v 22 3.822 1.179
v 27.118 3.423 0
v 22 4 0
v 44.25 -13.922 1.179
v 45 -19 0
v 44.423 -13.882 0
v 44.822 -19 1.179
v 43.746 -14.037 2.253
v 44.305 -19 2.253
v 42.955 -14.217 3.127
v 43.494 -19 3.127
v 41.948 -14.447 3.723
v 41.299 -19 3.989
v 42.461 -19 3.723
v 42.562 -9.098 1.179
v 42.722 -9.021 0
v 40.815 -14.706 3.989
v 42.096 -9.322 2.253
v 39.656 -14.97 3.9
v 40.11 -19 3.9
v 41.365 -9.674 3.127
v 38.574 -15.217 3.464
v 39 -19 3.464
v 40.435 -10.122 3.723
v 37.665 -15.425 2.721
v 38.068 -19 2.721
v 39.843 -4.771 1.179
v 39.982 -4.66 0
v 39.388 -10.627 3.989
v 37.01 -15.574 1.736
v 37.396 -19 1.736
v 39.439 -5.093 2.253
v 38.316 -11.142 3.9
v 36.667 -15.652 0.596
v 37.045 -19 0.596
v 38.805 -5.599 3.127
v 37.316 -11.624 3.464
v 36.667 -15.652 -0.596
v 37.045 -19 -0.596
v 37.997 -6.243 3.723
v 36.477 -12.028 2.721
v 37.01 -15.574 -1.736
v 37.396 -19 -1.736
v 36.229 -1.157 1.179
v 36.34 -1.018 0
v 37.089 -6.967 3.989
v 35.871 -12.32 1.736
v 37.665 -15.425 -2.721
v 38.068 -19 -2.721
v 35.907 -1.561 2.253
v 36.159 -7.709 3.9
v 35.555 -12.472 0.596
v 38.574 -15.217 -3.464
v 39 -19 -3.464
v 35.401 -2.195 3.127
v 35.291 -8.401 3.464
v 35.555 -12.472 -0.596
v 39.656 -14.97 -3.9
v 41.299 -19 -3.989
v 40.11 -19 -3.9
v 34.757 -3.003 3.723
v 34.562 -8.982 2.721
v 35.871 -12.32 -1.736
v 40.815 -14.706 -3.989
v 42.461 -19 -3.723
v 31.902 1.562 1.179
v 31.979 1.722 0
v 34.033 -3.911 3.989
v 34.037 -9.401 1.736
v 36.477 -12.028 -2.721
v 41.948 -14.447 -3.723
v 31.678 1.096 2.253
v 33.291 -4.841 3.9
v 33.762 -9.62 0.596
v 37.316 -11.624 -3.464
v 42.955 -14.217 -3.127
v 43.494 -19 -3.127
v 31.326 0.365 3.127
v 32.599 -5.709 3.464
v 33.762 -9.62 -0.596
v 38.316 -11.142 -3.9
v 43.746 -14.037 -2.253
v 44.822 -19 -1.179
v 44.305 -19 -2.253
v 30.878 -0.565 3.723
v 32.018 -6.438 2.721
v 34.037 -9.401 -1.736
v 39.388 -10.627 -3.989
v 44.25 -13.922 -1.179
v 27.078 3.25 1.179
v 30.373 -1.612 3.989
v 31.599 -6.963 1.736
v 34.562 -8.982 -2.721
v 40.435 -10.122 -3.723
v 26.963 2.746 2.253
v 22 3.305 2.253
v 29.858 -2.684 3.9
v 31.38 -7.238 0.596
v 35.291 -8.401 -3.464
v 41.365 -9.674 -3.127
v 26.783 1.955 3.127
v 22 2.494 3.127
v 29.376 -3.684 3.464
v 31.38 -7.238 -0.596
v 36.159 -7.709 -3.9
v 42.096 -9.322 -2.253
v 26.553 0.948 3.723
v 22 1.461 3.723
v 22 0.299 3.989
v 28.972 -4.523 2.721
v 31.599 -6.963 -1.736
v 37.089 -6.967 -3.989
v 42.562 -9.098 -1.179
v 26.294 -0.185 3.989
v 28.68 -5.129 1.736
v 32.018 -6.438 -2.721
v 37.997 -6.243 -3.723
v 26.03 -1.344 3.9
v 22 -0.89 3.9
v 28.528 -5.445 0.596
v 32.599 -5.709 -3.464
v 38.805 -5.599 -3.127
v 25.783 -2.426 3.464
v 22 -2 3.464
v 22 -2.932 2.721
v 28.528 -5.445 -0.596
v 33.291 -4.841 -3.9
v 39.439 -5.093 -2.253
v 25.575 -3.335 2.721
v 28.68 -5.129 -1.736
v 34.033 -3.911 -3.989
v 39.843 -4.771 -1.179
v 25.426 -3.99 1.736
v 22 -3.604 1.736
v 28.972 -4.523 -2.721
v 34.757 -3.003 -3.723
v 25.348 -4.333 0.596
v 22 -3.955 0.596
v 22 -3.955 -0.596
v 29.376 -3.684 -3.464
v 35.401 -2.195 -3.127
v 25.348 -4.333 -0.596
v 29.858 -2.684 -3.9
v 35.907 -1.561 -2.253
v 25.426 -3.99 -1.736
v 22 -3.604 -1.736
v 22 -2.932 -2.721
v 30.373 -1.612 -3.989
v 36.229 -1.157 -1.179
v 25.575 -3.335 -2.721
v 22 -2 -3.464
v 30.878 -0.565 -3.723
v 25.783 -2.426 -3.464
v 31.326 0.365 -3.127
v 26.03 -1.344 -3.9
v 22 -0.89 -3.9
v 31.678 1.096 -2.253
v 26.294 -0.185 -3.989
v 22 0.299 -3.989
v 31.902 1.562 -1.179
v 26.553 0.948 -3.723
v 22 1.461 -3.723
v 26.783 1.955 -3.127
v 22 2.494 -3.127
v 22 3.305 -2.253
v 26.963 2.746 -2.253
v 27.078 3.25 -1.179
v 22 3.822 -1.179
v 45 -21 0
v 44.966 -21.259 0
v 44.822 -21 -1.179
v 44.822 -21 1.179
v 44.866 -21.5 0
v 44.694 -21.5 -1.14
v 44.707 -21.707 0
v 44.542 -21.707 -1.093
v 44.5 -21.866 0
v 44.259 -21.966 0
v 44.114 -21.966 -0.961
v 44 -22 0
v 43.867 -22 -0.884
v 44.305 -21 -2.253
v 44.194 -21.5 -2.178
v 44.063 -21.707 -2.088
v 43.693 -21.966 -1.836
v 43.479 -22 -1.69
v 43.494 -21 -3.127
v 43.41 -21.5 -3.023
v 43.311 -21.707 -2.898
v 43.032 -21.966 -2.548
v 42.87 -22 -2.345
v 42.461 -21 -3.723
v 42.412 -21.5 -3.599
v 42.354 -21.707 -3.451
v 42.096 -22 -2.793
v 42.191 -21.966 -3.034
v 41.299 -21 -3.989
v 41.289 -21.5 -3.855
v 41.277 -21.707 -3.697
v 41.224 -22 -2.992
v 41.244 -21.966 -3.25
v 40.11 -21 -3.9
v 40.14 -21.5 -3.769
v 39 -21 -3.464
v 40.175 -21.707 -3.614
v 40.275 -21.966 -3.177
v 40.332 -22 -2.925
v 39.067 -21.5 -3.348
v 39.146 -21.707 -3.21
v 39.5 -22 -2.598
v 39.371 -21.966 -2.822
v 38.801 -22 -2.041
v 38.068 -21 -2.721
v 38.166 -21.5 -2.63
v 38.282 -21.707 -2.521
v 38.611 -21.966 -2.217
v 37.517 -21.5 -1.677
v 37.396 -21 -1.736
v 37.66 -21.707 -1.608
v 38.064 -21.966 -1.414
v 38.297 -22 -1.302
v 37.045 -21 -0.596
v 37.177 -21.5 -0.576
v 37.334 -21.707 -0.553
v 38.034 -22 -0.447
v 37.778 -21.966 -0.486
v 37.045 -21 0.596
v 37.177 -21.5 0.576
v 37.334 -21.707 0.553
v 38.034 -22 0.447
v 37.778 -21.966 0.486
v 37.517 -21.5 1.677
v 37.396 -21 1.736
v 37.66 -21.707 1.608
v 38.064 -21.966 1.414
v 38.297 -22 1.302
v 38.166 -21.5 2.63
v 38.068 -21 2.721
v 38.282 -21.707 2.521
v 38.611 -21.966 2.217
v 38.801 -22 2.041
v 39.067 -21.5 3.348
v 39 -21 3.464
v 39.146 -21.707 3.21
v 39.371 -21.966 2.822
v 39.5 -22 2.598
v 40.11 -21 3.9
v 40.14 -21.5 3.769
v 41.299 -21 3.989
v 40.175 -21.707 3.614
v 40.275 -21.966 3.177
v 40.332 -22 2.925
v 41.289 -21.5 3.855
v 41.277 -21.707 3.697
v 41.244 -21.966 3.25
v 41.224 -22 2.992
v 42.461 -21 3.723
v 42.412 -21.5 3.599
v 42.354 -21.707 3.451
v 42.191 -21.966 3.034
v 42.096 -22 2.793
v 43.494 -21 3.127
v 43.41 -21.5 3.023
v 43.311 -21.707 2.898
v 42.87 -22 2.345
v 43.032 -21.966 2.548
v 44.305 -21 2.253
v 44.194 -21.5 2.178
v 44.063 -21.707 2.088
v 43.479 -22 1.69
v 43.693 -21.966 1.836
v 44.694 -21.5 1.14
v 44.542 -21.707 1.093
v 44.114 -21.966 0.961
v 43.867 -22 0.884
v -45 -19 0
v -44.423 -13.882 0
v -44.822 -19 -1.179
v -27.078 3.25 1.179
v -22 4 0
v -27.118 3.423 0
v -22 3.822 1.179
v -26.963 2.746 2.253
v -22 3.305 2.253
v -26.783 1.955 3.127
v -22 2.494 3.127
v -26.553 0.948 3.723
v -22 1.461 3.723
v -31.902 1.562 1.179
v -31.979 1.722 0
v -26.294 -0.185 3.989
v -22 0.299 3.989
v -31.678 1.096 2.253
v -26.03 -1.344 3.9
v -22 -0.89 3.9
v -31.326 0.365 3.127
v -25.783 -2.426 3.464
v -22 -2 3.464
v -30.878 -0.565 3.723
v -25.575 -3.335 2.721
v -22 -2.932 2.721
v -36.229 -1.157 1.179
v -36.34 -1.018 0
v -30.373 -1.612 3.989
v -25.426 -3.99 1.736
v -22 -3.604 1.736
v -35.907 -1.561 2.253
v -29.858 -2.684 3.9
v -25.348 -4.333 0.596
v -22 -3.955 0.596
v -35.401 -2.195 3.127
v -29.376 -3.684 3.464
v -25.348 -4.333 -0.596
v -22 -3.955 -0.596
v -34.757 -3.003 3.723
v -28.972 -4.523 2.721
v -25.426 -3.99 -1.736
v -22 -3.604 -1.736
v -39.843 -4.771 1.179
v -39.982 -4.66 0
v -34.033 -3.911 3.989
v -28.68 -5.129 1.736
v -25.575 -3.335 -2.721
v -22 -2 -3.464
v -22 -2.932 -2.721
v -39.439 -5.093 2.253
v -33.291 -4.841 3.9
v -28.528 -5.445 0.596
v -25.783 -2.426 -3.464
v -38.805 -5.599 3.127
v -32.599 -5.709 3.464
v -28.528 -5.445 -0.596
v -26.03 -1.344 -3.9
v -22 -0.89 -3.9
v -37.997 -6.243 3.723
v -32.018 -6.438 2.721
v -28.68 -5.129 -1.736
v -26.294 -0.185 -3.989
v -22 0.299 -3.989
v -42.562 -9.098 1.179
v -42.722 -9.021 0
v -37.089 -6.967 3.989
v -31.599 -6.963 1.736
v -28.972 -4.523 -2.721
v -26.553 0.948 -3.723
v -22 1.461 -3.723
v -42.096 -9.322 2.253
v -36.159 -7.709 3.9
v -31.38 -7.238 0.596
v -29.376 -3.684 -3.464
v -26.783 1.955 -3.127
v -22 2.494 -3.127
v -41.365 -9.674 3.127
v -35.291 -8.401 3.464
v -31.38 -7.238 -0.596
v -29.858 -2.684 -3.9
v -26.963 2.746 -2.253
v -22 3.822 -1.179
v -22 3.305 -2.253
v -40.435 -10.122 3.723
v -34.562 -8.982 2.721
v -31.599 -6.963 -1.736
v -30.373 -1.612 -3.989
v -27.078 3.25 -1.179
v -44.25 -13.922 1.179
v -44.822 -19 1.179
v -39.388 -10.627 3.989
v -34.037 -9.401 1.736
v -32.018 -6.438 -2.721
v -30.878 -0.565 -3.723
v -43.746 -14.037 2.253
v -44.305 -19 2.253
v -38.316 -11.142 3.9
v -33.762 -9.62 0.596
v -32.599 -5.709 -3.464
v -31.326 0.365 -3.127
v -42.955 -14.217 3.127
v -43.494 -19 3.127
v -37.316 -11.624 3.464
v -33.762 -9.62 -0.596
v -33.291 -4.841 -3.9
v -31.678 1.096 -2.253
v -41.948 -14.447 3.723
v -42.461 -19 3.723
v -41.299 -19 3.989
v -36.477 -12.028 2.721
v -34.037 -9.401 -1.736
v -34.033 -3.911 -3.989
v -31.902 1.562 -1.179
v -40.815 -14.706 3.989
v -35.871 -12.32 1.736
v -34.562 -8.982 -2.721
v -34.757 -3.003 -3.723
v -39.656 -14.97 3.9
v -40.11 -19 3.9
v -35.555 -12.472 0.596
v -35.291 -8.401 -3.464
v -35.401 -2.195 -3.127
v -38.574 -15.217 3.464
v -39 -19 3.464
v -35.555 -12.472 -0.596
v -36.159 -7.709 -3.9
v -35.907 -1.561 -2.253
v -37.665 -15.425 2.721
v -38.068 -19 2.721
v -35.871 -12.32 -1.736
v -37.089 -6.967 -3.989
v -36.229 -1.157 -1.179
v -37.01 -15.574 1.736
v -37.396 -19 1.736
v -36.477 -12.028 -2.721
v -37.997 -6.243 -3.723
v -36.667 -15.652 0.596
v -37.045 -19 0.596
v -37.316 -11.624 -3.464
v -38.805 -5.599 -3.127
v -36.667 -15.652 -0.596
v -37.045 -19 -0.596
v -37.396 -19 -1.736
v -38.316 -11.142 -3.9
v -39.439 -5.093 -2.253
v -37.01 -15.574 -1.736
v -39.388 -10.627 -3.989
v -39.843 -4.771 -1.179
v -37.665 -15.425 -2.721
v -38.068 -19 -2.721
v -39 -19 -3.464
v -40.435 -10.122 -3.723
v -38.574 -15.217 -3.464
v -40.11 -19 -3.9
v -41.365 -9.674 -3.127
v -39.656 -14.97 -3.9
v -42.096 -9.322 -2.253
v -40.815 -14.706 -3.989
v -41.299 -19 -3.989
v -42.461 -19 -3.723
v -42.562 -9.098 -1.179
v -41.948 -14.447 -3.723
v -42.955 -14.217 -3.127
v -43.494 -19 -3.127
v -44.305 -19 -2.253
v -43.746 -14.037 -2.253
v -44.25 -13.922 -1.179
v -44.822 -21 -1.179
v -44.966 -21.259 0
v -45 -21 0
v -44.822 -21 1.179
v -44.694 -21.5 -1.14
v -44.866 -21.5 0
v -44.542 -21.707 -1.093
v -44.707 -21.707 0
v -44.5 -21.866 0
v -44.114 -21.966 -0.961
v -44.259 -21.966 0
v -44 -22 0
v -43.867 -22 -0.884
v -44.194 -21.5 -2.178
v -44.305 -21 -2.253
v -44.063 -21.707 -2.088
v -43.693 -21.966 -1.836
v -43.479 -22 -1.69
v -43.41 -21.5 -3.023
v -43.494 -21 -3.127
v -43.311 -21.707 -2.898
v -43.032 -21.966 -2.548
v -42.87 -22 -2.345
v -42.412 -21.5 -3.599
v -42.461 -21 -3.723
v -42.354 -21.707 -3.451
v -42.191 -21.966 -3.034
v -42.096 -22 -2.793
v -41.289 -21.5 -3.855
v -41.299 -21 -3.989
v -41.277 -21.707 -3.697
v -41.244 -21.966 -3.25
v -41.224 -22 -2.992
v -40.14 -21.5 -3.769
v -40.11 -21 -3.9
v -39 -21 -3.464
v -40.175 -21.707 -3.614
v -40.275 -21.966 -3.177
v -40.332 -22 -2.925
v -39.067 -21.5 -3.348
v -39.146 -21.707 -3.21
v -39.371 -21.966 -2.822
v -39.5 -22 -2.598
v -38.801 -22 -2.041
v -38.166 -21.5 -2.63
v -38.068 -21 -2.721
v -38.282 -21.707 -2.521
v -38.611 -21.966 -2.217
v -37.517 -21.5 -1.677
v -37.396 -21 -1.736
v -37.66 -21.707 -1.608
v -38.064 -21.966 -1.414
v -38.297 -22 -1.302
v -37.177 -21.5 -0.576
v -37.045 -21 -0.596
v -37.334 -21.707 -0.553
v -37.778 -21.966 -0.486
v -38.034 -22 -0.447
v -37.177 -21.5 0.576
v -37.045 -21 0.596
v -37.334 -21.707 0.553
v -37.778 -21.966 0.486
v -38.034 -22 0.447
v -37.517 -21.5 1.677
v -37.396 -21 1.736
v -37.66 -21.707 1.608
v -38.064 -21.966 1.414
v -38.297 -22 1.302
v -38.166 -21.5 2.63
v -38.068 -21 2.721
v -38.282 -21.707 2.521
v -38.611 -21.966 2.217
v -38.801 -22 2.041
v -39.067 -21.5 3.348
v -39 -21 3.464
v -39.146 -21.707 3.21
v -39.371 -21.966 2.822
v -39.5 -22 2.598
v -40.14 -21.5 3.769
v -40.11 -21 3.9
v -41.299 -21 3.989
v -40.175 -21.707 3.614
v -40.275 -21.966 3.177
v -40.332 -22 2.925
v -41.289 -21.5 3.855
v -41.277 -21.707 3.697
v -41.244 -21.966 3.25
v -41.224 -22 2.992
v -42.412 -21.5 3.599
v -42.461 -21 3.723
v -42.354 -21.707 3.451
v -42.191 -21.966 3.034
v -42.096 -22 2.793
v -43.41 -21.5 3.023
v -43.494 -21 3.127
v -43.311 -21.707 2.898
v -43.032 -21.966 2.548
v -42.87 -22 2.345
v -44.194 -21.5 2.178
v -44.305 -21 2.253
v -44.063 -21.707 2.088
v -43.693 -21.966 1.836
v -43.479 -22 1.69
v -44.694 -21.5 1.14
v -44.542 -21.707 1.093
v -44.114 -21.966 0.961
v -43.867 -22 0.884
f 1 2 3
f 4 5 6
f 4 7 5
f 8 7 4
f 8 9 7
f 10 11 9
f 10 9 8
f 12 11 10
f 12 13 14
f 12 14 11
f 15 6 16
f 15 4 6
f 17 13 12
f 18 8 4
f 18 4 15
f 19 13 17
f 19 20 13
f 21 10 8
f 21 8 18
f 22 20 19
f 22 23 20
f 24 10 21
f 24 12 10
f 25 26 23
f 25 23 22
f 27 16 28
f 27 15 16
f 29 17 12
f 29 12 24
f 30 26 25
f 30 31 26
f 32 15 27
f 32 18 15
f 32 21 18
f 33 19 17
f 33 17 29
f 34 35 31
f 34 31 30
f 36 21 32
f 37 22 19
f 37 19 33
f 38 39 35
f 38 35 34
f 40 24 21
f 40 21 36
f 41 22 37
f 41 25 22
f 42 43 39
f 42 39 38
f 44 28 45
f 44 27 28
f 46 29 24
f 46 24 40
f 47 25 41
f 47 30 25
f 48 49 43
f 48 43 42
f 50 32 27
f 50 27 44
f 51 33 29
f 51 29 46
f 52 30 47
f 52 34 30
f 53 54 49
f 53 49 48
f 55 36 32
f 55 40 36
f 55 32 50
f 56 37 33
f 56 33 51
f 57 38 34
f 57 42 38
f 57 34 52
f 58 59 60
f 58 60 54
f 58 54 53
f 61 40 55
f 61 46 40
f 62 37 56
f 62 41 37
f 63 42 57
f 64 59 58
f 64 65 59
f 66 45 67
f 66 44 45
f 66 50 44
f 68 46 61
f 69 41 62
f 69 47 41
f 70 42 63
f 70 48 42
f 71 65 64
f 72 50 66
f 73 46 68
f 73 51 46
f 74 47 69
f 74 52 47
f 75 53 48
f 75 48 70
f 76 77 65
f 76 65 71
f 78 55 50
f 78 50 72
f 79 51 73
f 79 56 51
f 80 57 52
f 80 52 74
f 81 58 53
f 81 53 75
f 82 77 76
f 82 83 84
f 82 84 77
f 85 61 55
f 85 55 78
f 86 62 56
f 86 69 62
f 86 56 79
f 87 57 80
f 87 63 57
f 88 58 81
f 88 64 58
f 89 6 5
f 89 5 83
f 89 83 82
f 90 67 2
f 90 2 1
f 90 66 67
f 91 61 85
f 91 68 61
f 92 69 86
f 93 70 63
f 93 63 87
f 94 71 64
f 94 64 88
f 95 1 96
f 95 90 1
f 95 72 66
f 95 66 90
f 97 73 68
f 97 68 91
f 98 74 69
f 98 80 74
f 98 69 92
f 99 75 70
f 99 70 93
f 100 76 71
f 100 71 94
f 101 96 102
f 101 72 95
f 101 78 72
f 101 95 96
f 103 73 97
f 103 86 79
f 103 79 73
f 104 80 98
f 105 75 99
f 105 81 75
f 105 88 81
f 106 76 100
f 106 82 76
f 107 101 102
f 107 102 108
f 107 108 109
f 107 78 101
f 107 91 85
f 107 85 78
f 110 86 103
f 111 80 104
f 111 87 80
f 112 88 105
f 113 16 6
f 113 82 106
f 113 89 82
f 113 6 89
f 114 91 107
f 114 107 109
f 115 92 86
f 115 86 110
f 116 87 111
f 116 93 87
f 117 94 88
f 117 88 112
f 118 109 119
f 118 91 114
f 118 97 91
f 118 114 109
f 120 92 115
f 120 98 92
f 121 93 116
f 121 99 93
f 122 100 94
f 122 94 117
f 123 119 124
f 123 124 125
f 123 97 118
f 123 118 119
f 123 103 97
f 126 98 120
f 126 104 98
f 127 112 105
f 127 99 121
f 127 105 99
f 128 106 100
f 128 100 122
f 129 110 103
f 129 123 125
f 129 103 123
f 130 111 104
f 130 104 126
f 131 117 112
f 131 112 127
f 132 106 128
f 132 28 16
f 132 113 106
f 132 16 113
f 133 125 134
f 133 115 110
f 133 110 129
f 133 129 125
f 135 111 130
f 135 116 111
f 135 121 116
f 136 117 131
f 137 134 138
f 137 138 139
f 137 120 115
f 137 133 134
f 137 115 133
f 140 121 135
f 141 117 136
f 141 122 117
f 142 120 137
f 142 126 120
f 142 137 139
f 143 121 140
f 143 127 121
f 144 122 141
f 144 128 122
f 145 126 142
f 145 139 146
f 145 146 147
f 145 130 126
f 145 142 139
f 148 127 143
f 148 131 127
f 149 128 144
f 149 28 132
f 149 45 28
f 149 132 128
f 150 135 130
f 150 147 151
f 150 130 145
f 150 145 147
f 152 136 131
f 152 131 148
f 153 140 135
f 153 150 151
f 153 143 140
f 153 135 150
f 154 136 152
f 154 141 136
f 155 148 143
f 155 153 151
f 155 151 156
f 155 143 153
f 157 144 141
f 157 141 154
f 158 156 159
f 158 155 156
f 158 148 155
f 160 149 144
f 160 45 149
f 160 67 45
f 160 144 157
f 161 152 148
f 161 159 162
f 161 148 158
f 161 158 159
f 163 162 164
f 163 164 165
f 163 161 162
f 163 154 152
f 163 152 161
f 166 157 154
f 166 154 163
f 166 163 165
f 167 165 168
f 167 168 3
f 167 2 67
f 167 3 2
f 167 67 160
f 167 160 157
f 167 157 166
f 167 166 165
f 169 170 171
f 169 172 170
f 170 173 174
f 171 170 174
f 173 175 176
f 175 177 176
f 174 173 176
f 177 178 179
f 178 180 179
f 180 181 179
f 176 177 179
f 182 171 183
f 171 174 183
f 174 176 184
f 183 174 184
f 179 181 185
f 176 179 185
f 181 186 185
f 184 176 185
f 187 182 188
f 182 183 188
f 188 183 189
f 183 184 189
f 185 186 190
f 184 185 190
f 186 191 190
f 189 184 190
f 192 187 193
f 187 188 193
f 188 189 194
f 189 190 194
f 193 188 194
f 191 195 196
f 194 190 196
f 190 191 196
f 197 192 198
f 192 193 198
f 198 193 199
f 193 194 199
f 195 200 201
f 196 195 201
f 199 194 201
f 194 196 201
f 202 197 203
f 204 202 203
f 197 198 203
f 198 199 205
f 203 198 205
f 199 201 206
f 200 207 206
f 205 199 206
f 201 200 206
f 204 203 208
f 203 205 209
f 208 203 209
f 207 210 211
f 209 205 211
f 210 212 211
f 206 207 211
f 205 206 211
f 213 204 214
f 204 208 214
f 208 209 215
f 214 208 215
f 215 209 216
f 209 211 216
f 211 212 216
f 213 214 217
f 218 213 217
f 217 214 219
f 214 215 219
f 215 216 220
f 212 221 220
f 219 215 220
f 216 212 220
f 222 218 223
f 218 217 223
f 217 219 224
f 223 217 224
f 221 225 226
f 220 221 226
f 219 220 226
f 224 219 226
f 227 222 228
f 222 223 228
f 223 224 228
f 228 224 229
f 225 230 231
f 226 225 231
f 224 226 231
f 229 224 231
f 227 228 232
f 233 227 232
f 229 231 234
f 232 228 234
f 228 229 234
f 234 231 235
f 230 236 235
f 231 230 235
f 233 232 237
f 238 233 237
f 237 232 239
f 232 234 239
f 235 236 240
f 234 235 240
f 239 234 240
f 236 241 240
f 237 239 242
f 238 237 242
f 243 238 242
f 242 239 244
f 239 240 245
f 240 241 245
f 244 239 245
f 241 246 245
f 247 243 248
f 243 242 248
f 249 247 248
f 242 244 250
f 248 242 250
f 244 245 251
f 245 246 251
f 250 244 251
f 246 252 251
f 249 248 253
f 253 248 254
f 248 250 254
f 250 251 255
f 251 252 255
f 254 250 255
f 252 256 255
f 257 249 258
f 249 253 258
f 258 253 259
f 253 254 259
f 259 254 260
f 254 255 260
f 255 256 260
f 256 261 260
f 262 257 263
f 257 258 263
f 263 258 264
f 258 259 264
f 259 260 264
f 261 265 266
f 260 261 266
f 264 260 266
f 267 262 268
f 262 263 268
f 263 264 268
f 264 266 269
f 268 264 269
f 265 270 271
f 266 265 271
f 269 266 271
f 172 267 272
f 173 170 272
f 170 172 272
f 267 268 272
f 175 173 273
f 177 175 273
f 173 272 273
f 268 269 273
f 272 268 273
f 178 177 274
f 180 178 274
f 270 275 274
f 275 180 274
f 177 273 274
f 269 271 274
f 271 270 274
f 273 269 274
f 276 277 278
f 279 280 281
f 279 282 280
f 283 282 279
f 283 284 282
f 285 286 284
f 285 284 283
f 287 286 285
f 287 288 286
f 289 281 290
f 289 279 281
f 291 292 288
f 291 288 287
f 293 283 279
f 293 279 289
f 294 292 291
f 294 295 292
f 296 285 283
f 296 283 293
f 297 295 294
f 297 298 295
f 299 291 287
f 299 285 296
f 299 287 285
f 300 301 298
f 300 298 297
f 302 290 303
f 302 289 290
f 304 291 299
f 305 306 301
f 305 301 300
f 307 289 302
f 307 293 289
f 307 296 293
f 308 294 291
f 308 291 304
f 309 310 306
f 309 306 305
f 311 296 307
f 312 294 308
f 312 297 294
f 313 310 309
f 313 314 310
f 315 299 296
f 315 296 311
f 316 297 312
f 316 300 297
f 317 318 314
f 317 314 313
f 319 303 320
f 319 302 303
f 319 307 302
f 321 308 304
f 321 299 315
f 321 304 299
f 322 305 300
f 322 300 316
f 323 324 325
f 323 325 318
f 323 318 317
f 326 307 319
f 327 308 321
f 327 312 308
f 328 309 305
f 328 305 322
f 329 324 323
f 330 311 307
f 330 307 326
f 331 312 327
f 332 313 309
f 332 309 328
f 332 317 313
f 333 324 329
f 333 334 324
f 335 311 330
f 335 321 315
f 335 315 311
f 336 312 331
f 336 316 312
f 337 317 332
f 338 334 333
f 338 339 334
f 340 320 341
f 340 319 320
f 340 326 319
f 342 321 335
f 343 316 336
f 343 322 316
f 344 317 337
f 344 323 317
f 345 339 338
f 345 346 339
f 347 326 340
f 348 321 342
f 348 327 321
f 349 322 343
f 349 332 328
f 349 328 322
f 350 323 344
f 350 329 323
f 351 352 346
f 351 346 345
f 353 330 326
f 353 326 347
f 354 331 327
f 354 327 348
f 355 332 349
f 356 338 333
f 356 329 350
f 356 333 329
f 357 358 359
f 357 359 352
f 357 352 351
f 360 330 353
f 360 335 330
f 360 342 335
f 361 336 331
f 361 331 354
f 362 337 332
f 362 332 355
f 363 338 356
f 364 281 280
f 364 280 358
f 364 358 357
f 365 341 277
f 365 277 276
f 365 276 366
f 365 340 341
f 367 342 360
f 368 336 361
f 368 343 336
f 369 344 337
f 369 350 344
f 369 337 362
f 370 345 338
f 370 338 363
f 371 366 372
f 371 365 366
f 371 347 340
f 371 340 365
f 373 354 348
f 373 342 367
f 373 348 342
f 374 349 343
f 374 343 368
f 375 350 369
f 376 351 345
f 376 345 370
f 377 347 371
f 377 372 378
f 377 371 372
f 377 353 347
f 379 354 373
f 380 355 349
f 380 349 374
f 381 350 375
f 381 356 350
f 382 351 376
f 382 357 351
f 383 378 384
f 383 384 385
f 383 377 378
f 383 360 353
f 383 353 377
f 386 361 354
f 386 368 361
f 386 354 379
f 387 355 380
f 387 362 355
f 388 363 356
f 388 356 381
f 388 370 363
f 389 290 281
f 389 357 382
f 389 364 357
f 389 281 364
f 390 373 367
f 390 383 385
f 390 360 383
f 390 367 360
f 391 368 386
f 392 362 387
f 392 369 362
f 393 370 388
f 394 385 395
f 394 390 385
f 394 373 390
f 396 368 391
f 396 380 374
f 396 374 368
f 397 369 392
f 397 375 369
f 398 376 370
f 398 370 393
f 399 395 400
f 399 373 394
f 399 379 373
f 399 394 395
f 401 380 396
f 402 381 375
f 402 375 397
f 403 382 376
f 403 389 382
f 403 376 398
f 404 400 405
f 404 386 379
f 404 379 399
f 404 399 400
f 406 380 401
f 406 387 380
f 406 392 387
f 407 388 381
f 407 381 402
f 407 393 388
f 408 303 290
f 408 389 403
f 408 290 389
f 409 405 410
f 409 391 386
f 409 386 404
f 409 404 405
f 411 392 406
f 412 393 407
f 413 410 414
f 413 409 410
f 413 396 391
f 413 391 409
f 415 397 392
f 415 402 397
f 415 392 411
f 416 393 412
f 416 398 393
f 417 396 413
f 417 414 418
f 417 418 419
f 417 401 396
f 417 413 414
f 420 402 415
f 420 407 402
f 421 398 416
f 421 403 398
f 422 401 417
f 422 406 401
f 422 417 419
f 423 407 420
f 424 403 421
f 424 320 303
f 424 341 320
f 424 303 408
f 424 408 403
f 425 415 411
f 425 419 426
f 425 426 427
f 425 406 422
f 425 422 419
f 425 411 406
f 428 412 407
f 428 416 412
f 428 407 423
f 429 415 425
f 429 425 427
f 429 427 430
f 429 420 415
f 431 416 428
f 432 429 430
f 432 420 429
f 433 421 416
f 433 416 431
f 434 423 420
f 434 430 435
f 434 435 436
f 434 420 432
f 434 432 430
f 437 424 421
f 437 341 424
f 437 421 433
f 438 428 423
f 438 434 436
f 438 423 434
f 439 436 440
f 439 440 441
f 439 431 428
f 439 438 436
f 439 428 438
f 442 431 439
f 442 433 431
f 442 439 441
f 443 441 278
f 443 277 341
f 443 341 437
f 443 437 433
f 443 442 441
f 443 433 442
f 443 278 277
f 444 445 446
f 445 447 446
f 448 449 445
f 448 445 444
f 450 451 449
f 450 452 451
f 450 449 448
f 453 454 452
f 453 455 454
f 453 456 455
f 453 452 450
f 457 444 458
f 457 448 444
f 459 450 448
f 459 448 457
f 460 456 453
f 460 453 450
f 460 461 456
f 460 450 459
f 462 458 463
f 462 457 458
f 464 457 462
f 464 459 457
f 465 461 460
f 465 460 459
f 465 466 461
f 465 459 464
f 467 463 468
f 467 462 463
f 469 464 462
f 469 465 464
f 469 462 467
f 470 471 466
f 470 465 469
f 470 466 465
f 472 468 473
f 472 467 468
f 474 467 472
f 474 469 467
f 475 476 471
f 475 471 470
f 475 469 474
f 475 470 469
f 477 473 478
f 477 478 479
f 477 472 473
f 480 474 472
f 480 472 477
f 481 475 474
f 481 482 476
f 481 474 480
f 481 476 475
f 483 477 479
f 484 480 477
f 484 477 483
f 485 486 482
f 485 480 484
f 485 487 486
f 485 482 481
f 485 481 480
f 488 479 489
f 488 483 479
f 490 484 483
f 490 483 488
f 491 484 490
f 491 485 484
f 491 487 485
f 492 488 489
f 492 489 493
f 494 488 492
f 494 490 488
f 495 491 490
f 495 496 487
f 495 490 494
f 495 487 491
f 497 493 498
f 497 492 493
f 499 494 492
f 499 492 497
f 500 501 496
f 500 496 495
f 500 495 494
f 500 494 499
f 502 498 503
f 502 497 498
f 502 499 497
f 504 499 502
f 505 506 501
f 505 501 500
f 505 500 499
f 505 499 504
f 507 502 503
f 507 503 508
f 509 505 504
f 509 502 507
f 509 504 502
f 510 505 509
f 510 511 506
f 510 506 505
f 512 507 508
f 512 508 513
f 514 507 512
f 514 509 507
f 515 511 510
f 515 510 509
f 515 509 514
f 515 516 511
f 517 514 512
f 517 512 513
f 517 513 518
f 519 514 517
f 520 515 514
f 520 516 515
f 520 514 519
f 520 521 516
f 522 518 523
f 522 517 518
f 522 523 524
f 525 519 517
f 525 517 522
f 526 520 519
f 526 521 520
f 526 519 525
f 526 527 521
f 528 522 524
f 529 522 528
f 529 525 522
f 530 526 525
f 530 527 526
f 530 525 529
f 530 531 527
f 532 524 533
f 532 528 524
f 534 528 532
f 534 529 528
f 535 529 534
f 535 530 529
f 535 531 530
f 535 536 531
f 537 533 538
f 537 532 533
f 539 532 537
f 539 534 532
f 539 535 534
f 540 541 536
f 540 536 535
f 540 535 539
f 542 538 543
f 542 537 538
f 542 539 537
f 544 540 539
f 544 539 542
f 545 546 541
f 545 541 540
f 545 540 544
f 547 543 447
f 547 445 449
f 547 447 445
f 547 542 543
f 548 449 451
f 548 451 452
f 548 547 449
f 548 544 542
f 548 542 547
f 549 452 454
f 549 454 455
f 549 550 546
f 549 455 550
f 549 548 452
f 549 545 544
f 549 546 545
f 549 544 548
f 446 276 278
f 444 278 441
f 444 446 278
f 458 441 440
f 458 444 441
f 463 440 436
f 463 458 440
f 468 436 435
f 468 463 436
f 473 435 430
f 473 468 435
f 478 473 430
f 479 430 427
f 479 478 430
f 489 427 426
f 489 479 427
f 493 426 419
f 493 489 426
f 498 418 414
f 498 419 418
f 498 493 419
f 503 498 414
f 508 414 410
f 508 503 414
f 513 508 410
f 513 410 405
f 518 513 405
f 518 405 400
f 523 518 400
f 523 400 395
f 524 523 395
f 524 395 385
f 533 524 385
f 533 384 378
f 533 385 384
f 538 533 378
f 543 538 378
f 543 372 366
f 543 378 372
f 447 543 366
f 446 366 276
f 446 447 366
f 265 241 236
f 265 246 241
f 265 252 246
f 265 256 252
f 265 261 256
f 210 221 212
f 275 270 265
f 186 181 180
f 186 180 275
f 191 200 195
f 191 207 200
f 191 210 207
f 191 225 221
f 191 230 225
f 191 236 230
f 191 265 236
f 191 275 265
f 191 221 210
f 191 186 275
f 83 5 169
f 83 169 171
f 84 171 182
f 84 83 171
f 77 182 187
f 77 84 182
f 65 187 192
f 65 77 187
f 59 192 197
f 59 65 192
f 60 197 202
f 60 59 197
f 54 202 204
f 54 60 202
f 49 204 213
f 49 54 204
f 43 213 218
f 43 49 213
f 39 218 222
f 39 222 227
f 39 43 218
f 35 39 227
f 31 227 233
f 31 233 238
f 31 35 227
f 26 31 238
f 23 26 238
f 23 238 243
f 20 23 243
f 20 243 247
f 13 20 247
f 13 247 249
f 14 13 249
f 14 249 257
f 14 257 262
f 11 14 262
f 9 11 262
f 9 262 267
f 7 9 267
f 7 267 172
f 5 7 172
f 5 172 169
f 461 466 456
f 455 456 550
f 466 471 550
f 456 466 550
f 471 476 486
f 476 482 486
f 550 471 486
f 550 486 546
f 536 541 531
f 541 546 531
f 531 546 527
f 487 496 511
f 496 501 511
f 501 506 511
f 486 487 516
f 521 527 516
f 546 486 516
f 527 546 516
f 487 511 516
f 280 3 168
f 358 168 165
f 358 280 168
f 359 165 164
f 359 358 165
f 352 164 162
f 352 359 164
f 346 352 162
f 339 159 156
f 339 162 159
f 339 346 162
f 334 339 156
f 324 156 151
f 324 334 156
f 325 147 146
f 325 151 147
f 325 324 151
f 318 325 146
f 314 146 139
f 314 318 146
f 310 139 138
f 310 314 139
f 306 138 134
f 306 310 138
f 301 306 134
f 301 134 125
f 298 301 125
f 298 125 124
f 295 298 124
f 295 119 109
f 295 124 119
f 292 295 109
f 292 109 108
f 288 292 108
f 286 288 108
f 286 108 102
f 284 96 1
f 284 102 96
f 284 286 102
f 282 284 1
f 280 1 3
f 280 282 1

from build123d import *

# Parameters (mm, degrees)
SKETCH2_R = 4
FILLET1_R = 1


with BuildPart() as part:
    # Sweep1: sweep along a path in Sketch1
    with BuildLine(Plane.XY) as sweep1_path:
        Line((41, -22), (41, -19))
        ThreePointArc((41, -19), (35.435028843, -5.564971157), (22, 0))
        Line((22, 0), (-22, 0))
        ThreePointArc((-22, 0), (-35.435028843, -5.564971157), (-41, -19))
        Line((-41, -19), (-41, -22))
    # Sketch2 → Sweep1 (sweep)
    with BuildSketch(Plane(origin=(41, -22, 0), x_dir=(1, 0, 0), z_dir=(0, -1, 0))):
        Circle(SKETCH2_R)
    sweep(path=sweep1_path.line)

    # Fillet1
    fillet1_edges = [part.edges().sort_by_distance(p)[0] for p in [
        (37, -22, 0),
        (-37, -22, 0),
    ]]
    fillet(fillet1_edges, radius=FILLET1_R)


solid = part.part
